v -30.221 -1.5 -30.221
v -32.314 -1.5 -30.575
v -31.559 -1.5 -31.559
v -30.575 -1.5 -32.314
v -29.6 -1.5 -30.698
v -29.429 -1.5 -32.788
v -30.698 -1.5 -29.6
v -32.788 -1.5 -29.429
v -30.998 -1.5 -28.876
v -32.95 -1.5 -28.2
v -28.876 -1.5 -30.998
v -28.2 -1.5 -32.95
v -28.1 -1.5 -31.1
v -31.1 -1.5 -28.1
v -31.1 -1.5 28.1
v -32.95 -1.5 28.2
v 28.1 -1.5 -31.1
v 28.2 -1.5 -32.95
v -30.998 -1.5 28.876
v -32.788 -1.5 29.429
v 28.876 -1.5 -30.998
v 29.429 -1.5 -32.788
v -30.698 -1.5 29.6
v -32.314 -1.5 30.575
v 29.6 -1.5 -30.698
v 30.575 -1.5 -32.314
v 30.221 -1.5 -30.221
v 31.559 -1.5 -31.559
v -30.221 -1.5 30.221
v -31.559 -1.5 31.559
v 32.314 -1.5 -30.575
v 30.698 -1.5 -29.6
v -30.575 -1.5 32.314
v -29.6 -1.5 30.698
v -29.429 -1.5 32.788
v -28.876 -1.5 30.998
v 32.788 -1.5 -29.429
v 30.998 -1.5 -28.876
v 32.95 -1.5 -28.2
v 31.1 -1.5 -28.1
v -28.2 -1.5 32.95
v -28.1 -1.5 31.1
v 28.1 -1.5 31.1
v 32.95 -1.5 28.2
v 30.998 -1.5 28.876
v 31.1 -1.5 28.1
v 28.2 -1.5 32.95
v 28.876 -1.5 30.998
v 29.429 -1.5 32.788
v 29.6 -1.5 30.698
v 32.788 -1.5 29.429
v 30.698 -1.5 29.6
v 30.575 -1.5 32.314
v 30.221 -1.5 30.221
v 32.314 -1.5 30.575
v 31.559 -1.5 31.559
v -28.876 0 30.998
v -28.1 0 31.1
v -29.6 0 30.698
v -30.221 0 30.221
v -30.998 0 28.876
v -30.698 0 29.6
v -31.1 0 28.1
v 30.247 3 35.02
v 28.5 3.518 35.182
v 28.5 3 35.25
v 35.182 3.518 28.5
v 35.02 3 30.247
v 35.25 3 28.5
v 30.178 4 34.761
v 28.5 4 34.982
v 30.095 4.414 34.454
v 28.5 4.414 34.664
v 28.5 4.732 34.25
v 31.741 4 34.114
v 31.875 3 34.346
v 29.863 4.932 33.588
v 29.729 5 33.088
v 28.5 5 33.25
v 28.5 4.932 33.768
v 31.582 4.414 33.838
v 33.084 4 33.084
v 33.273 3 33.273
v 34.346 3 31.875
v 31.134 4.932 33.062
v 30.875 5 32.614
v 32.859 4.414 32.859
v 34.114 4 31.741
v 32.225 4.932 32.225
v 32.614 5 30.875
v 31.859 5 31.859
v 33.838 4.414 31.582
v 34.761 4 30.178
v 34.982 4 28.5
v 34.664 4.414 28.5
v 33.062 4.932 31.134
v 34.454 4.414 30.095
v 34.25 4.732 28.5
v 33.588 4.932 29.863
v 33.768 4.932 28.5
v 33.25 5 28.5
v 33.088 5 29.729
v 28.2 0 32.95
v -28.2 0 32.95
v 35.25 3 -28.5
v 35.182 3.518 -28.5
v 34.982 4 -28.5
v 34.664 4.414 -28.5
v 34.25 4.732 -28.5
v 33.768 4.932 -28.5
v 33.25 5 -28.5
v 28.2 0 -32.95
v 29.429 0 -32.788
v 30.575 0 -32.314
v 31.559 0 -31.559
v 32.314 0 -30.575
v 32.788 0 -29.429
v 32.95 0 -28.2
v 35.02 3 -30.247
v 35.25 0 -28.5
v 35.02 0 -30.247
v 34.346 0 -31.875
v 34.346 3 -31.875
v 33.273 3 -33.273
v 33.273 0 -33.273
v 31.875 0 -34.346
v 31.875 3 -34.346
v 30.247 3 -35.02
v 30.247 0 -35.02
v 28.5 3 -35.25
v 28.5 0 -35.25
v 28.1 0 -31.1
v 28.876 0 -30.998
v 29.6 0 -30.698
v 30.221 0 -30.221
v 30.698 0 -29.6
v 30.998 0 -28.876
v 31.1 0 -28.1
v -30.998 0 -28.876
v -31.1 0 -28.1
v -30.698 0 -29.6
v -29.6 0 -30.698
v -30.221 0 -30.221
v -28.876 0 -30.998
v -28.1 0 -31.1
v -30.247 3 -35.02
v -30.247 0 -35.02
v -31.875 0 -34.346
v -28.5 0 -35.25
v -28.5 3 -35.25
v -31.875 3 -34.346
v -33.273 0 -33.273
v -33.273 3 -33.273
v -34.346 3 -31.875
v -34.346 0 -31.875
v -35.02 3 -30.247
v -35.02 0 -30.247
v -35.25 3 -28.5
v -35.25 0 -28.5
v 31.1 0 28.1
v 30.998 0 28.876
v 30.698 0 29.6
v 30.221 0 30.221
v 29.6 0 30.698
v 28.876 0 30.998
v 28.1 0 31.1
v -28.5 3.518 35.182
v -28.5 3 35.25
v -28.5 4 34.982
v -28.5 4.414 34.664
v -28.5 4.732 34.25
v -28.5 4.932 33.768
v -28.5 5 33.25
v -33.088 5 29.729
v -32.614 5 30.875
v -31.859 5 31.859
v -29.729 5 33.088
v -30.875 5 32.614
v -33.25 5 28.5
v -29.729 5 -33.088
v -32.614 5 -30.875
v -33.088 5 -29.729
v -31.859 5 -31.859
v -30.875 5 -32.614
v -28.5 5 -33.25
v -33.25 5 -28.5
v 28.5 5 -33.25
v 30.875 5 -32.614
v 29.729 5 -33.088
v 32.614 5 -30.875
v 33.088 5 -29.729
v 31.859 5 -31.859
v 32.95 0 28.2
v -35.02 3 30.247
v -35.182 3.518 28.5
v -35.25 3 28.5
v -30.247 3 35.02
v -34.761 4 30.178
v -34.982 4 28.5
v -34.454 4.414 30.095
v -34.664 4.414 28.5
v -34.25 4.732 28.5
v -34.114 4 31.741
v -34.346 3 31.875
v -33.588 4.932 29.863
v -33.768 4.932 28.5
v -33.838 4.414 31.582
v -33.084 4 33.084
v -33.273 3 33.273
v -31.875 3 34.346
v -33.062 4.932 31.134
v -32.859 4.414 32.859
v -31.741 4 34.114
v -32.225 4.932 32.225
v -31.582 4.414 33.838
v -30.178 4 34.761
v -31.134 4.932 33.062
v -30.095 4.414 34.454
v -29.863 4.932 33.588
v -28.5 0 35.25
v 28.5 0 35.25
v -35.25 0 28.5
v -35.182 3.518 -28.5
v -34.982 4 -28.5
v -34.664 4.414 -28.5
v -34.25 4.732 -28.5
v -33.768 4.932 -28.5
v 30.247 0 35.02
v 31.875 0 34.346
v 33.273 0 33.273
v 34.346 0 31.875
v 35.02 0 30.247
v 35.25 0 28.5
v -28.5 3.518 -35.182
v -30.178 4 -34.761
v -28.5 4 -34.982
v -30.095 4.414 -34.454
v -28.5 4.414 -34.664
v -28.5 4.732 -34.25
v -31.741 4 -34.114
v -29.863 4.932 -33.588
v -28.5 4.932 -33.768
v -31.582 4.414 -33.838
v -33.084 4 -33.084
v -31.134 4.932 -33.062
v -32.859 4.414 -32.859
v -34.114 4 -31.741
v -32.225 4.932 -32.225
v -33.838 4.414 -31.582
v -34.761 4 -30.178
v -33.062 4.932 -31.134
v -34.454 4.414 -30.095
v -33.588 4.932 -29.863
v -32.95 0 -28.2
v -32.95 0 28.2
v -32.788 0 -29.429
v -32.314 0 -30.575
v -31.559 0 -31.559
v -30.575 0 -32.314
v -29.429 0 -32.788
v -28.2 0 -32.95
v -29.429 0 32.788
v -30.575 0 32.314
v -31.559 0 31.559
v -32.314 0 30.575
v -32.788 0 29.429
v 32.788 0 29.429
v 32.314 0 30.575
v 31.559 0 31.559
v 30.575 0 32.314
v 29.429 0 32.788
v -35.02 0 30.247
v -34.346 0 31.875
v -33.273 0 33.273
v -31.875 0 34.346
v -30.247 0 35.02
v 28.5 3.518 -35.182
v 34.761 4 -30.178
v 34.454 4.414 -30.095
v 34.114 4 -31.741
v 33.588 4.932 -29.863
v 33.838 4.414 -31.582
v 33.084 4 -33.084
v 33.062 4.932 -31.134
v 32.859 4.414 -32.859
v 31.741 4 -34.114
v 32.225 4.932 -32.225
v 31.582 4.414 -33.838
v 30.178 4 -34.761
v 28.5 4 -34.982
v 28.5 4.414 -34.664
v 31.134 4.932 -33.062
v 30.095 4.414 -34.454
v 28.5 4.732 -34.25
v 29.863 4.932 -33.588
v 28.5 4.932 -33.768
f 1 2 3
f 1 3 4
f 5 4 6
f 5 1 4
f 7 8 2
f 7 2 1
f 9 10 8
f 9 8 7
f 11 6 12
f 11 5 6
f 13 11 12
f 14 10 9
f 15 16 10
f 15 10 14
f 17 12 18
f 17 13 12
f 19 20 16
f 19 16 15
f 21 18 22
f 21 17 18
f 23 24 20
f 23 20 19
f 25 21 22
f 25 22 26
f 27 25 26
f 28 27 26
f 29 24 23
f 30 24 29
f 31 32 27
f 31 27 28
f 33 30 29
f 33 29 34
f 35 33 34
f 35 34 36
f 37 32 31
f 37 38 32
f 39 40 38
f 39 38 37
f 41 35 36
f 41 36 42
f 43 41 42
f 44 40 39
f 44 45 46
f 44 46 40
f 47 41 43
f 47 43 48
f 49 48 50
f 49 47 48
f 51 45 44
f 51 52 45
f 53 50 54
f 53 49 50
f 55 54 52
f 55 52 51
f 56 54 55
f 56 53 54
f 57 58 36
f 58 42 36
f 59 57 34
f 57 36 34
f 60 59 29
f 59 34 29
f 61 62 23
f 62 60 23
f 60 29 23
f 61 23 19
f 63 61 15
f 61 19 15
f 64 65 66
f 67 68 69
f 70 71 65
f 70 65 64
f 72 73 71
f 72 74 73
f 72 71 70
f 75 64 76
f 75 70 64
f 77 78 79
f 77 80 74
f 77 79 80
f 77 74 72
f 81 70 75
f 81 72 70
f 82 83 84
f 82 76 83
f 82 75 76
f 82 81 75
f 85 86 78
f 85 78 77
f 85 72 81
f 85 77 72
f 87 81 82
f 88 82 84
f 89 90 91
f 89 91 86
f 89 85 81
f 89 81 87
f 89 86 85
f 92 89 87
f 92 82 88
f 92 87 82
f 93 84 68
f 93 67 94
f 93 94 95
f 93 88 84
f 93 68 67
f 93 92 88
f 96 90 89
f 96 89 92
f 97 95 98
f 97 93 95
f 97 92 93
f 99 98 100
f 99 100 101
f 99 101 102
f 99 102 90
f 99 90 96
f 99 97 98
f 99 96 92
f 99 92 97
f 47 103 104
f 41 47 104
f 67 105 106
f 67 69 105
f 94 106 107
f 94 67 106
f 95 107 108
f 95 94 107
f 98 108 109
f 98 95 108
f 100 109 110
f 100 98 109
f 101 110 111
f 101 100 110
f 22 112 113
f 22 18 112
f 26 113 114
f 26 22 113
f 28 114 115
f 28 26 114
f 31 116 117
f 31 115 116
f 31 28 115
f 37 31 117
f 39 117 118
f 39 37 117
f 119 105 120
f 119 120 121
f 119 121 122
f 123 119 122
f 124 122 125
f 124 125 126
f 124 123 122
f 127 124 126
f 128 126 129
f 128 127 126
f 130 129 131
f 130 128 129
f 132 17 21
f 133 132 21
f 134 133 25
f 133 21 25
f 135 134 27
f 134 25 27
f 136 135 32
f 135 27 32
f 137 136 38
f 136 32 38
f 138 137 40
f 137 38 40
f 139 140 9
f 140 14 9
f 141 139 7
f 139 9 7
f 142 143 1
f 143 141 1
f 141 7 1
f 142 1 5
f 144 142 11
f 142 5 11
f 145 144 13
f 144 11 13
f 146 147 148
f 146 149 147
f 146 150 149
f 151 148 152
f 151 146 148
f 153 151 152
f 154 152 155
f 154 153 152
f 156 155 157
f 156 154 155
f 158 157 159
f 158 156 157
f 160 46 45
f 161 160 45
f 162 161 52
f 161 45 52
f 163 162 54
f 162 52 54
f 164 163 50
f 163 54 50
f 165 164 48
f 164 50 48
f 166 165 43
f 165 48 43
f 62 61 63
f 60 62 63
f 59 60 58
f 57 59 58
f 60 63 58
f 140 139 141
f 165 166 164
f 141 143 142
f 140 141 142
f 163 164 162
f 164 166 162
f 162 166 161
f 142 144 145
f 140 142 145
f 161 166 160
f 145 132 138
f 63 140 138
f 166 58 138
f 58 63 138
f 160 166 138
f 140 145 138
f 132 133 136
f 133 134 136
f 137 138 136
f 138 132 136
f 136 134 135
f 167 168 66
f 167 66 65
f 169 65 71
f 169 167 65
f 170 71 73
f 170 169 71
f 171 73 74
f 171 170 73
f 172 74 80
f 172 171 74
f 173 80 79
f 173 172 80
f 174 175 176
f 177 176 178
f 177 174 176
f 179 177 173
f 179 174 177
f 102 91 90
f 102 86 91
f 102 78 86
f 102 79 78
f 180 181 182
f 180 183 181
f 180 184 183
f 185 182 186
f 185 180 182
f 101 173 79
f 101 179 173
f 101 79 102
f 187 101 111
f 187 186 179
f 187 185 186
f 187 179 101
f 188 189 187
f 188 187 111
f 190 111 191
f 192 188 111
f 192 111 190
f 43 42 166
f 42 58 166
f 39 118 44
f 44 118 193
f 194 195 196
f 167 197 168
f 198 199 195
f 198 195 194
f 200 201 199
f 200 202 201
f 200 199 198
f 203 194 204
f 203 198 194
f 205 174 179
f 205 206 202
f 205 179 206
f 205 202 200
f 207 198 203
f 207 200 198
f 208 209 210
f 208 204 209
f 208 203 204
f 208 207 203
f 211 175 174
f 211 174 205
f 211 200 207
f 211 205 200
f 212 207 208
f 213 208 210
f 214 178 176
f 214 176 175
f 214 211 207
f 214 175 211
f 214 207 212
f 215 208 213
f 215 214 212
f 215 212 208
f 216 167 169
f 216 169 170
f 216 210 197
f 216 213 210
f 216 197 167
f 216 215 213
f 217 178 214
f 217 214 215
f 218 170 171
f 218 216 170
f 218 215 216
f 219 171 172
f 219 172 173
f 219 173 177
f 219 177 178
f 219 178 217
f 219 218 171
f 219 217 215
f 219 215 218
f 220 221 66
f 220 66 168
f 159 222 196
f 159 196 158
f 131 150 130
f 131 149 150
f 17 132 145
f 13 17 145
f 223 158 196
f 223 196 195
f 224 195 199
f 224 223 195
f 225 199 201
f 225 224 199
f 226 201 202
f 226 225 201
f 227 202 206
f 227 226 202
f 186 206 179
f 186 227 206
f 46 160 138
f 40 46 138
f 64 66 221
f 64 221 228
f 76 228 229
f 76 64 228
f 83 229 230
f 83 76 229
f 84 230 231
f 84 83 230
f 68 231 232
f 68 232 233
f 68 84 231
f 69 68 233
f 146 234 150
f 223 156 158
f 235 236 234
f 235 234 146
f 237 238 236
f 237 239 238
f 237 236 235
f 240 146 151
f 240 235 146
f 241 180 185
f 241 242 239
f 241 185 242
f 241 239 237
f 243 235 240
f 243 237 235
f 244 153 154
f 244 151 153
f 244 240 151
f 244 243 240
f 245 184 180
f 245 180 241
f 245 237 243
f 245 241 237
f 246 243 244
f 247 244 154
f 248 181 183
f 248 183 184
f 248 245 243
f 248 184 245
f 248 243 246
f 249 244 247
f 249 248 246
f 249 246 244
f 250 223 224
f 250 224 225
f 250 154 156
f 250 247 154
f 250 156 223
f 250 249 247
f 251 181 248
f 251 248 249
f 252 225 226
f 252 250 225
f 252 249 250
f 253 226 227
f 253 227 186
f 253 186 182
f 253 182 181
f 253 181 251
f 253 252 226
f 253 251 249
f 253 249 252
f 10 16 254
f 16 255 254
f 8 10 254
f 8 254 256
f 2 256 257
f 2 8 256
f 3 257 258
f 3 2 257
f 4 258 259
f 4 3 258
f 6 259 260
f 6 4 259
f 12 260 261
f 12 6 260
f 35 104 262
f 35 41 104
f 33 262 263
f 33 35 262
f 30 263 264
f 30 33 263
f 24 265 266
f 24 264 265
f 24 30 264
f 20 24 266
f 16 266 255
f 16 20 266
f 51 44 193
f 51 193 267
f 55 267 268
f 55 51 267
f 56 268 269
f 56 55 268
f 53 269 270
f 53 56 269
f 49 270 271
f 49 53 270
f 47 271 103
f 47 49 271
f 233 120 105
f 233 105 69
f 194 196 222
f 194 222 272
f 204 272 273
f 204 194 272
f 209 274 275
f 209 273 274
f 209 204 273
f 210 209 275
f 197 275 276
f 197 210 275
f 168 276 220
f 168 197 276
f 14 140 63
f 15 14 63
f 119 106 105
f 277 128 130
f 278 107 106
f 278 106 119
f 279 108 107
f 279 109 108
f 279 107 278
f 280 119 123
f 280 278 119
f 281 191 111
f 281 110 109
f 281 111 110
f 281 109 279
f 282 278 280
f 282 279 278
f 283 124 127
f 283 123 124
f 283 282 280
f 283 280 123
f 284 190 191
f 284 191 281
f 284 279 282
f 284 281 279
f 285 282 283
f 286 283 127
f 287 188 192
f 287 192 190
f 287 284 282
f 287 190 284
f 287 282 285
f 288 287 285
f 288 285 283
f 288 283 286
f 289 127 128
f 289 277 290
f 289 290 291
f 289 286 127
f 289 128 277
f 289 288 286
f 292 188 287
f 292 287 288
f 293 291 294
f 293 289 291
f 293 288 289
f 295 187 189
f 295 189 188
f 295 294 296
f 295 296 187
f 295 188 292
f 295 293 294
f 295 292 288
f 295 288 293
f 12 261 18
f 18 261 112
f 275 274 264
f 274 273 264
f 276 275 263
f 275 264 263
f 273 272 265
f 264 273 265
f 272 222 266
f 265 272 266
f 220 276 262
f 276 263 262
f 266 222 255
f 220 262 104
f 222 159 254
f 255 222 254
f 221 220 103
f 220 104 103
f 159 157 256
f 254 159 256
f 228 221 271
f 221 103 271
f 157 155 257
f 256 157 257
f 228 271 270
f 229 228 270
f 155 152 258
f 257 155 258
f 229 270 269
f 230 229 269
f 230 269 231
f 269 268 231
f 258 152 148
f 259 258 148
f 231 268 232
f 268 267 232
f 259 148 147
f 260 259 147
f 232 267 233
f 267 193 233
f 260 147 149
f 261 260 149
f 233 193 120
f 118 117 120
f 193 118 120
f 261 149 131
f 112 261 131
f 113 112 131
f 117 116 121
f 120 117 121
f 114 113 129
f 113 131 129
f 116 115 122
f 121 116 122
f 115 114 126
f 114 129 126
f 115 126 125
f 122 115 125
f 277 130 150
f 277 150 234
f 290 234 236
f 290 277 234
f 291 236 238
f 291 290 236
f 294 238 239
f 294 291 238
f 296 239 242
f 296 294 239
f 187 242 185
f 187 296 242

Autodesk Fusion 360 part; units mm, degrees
sketch "Sketch1" plane through (0, 0, 0) normal (0, 1, 0) x (1, 0, 0)
  line L0 (35.25, -35.25) -> (-35.25, -35.25)
  line L1 (-35.25, -35.25) -> (-35.25, 35.25)
  line L2 (-35.25, 35.25) -> (35.25, 35.25)
  line L3 (35.25, 35.25) -> (35.25, -35.25)
  line L4 (35.25, -35.25) -> (-35.25, 35.25) construction
  line L5 (-35.25, -35.25) -> (35.25, 35.25) construction
  dimension "d1" = 70.5
  dimension "d2" = 70.5
extrude "Extrude1" add sketch "Sketch1" along normal blind 5
sketch "Sketch2" plane through (0, 0, 0) normal (0, -1, 0) x (1, 0, 0)
  line L0 (-35.25, -35.25) -> (35.25, -35.25)
  line L1 (35.25, -35.25) -> (35.25, 35.25)
  line L2 (35.25, 35.25) -> (-35.25, 35.25)
  line L3 (-35.25, 35.25) -> (-35.25, -35.25)
  line L4 (32.95, -32.95) -> (32.95, 32.95)
  line L5 (32.95, 32.95) -> (-32.95, 32.95)
  line L6 (-32.95, 32.95) -> (-32.95, -32.95)
  line L7 (-32.95, -32.95) -> (32.95, -32.95)
  line L8 (32.95, 0) -> (30.95, 0)
  line L9 (0, -32.95) -> (0, -30.95)
  line L10 (-32.95, 0) -> (-30.95, 0)
  line L11 (0, 32.95) -> (0, 30.95)
  line L12 (-31.1, 31.1) -> (31.1, 31.1)
  line L13 (31.1, 31.1) -> (31.1, -31.1)
  line L14 (31.1, -31.1) -> (-31.1, -31.1)
  line L15 (-31.1, -31.1) -> (-31.1, 31.1)
  dimension "d5" = -2.3
  dimension "d6" = 2
  dimension "d7" = 2
  dimension "d8" = 2
  dimension "d9" = 2
extrude "Extrude2" add sketch "Sketch2" along normal blind 1.5 contours L4 L7 L8 L9 L13 L14 | L4 L5 L8 L11 L12 L13 | L6 L7 L9 L10 L14 L15 | L5 L6 L10 L11 L12 L15
fillet "Fillet1" radius 4.75 4 edges at (-32.95, -0.75, 32.95) (32.95, -0.75, 32.95) (32.95, -0.75, -32.95) (-32.95, -0.75, -32.95)
fillet "Fillet2" radius 3 4 edges at (31.1, -0.75, 31.1) (-31.1, -0.75, 31.1) (31.1, -0.75, -31.1) (-31.1, -0.75, -31.1)
fillet "Fillet3" radius 6.75 4 edges at (-35.25, 2.5, 35.25) (35.25, 2.5, 35.25) (35.25, 2.5, -35.25) (-35.25, 2.5, -35.25)
fillet "Fillet4" radius 2 8 edges at (-33.273, 5, -33.273) (-35.25, 5, 0) (-33.273, 5, 33.273) (0, 5, 35.25) (33.273, 5, 33.273) (35.25, 5, 0) (33.273, 5, -33.273) (0, 5, -35.25)
